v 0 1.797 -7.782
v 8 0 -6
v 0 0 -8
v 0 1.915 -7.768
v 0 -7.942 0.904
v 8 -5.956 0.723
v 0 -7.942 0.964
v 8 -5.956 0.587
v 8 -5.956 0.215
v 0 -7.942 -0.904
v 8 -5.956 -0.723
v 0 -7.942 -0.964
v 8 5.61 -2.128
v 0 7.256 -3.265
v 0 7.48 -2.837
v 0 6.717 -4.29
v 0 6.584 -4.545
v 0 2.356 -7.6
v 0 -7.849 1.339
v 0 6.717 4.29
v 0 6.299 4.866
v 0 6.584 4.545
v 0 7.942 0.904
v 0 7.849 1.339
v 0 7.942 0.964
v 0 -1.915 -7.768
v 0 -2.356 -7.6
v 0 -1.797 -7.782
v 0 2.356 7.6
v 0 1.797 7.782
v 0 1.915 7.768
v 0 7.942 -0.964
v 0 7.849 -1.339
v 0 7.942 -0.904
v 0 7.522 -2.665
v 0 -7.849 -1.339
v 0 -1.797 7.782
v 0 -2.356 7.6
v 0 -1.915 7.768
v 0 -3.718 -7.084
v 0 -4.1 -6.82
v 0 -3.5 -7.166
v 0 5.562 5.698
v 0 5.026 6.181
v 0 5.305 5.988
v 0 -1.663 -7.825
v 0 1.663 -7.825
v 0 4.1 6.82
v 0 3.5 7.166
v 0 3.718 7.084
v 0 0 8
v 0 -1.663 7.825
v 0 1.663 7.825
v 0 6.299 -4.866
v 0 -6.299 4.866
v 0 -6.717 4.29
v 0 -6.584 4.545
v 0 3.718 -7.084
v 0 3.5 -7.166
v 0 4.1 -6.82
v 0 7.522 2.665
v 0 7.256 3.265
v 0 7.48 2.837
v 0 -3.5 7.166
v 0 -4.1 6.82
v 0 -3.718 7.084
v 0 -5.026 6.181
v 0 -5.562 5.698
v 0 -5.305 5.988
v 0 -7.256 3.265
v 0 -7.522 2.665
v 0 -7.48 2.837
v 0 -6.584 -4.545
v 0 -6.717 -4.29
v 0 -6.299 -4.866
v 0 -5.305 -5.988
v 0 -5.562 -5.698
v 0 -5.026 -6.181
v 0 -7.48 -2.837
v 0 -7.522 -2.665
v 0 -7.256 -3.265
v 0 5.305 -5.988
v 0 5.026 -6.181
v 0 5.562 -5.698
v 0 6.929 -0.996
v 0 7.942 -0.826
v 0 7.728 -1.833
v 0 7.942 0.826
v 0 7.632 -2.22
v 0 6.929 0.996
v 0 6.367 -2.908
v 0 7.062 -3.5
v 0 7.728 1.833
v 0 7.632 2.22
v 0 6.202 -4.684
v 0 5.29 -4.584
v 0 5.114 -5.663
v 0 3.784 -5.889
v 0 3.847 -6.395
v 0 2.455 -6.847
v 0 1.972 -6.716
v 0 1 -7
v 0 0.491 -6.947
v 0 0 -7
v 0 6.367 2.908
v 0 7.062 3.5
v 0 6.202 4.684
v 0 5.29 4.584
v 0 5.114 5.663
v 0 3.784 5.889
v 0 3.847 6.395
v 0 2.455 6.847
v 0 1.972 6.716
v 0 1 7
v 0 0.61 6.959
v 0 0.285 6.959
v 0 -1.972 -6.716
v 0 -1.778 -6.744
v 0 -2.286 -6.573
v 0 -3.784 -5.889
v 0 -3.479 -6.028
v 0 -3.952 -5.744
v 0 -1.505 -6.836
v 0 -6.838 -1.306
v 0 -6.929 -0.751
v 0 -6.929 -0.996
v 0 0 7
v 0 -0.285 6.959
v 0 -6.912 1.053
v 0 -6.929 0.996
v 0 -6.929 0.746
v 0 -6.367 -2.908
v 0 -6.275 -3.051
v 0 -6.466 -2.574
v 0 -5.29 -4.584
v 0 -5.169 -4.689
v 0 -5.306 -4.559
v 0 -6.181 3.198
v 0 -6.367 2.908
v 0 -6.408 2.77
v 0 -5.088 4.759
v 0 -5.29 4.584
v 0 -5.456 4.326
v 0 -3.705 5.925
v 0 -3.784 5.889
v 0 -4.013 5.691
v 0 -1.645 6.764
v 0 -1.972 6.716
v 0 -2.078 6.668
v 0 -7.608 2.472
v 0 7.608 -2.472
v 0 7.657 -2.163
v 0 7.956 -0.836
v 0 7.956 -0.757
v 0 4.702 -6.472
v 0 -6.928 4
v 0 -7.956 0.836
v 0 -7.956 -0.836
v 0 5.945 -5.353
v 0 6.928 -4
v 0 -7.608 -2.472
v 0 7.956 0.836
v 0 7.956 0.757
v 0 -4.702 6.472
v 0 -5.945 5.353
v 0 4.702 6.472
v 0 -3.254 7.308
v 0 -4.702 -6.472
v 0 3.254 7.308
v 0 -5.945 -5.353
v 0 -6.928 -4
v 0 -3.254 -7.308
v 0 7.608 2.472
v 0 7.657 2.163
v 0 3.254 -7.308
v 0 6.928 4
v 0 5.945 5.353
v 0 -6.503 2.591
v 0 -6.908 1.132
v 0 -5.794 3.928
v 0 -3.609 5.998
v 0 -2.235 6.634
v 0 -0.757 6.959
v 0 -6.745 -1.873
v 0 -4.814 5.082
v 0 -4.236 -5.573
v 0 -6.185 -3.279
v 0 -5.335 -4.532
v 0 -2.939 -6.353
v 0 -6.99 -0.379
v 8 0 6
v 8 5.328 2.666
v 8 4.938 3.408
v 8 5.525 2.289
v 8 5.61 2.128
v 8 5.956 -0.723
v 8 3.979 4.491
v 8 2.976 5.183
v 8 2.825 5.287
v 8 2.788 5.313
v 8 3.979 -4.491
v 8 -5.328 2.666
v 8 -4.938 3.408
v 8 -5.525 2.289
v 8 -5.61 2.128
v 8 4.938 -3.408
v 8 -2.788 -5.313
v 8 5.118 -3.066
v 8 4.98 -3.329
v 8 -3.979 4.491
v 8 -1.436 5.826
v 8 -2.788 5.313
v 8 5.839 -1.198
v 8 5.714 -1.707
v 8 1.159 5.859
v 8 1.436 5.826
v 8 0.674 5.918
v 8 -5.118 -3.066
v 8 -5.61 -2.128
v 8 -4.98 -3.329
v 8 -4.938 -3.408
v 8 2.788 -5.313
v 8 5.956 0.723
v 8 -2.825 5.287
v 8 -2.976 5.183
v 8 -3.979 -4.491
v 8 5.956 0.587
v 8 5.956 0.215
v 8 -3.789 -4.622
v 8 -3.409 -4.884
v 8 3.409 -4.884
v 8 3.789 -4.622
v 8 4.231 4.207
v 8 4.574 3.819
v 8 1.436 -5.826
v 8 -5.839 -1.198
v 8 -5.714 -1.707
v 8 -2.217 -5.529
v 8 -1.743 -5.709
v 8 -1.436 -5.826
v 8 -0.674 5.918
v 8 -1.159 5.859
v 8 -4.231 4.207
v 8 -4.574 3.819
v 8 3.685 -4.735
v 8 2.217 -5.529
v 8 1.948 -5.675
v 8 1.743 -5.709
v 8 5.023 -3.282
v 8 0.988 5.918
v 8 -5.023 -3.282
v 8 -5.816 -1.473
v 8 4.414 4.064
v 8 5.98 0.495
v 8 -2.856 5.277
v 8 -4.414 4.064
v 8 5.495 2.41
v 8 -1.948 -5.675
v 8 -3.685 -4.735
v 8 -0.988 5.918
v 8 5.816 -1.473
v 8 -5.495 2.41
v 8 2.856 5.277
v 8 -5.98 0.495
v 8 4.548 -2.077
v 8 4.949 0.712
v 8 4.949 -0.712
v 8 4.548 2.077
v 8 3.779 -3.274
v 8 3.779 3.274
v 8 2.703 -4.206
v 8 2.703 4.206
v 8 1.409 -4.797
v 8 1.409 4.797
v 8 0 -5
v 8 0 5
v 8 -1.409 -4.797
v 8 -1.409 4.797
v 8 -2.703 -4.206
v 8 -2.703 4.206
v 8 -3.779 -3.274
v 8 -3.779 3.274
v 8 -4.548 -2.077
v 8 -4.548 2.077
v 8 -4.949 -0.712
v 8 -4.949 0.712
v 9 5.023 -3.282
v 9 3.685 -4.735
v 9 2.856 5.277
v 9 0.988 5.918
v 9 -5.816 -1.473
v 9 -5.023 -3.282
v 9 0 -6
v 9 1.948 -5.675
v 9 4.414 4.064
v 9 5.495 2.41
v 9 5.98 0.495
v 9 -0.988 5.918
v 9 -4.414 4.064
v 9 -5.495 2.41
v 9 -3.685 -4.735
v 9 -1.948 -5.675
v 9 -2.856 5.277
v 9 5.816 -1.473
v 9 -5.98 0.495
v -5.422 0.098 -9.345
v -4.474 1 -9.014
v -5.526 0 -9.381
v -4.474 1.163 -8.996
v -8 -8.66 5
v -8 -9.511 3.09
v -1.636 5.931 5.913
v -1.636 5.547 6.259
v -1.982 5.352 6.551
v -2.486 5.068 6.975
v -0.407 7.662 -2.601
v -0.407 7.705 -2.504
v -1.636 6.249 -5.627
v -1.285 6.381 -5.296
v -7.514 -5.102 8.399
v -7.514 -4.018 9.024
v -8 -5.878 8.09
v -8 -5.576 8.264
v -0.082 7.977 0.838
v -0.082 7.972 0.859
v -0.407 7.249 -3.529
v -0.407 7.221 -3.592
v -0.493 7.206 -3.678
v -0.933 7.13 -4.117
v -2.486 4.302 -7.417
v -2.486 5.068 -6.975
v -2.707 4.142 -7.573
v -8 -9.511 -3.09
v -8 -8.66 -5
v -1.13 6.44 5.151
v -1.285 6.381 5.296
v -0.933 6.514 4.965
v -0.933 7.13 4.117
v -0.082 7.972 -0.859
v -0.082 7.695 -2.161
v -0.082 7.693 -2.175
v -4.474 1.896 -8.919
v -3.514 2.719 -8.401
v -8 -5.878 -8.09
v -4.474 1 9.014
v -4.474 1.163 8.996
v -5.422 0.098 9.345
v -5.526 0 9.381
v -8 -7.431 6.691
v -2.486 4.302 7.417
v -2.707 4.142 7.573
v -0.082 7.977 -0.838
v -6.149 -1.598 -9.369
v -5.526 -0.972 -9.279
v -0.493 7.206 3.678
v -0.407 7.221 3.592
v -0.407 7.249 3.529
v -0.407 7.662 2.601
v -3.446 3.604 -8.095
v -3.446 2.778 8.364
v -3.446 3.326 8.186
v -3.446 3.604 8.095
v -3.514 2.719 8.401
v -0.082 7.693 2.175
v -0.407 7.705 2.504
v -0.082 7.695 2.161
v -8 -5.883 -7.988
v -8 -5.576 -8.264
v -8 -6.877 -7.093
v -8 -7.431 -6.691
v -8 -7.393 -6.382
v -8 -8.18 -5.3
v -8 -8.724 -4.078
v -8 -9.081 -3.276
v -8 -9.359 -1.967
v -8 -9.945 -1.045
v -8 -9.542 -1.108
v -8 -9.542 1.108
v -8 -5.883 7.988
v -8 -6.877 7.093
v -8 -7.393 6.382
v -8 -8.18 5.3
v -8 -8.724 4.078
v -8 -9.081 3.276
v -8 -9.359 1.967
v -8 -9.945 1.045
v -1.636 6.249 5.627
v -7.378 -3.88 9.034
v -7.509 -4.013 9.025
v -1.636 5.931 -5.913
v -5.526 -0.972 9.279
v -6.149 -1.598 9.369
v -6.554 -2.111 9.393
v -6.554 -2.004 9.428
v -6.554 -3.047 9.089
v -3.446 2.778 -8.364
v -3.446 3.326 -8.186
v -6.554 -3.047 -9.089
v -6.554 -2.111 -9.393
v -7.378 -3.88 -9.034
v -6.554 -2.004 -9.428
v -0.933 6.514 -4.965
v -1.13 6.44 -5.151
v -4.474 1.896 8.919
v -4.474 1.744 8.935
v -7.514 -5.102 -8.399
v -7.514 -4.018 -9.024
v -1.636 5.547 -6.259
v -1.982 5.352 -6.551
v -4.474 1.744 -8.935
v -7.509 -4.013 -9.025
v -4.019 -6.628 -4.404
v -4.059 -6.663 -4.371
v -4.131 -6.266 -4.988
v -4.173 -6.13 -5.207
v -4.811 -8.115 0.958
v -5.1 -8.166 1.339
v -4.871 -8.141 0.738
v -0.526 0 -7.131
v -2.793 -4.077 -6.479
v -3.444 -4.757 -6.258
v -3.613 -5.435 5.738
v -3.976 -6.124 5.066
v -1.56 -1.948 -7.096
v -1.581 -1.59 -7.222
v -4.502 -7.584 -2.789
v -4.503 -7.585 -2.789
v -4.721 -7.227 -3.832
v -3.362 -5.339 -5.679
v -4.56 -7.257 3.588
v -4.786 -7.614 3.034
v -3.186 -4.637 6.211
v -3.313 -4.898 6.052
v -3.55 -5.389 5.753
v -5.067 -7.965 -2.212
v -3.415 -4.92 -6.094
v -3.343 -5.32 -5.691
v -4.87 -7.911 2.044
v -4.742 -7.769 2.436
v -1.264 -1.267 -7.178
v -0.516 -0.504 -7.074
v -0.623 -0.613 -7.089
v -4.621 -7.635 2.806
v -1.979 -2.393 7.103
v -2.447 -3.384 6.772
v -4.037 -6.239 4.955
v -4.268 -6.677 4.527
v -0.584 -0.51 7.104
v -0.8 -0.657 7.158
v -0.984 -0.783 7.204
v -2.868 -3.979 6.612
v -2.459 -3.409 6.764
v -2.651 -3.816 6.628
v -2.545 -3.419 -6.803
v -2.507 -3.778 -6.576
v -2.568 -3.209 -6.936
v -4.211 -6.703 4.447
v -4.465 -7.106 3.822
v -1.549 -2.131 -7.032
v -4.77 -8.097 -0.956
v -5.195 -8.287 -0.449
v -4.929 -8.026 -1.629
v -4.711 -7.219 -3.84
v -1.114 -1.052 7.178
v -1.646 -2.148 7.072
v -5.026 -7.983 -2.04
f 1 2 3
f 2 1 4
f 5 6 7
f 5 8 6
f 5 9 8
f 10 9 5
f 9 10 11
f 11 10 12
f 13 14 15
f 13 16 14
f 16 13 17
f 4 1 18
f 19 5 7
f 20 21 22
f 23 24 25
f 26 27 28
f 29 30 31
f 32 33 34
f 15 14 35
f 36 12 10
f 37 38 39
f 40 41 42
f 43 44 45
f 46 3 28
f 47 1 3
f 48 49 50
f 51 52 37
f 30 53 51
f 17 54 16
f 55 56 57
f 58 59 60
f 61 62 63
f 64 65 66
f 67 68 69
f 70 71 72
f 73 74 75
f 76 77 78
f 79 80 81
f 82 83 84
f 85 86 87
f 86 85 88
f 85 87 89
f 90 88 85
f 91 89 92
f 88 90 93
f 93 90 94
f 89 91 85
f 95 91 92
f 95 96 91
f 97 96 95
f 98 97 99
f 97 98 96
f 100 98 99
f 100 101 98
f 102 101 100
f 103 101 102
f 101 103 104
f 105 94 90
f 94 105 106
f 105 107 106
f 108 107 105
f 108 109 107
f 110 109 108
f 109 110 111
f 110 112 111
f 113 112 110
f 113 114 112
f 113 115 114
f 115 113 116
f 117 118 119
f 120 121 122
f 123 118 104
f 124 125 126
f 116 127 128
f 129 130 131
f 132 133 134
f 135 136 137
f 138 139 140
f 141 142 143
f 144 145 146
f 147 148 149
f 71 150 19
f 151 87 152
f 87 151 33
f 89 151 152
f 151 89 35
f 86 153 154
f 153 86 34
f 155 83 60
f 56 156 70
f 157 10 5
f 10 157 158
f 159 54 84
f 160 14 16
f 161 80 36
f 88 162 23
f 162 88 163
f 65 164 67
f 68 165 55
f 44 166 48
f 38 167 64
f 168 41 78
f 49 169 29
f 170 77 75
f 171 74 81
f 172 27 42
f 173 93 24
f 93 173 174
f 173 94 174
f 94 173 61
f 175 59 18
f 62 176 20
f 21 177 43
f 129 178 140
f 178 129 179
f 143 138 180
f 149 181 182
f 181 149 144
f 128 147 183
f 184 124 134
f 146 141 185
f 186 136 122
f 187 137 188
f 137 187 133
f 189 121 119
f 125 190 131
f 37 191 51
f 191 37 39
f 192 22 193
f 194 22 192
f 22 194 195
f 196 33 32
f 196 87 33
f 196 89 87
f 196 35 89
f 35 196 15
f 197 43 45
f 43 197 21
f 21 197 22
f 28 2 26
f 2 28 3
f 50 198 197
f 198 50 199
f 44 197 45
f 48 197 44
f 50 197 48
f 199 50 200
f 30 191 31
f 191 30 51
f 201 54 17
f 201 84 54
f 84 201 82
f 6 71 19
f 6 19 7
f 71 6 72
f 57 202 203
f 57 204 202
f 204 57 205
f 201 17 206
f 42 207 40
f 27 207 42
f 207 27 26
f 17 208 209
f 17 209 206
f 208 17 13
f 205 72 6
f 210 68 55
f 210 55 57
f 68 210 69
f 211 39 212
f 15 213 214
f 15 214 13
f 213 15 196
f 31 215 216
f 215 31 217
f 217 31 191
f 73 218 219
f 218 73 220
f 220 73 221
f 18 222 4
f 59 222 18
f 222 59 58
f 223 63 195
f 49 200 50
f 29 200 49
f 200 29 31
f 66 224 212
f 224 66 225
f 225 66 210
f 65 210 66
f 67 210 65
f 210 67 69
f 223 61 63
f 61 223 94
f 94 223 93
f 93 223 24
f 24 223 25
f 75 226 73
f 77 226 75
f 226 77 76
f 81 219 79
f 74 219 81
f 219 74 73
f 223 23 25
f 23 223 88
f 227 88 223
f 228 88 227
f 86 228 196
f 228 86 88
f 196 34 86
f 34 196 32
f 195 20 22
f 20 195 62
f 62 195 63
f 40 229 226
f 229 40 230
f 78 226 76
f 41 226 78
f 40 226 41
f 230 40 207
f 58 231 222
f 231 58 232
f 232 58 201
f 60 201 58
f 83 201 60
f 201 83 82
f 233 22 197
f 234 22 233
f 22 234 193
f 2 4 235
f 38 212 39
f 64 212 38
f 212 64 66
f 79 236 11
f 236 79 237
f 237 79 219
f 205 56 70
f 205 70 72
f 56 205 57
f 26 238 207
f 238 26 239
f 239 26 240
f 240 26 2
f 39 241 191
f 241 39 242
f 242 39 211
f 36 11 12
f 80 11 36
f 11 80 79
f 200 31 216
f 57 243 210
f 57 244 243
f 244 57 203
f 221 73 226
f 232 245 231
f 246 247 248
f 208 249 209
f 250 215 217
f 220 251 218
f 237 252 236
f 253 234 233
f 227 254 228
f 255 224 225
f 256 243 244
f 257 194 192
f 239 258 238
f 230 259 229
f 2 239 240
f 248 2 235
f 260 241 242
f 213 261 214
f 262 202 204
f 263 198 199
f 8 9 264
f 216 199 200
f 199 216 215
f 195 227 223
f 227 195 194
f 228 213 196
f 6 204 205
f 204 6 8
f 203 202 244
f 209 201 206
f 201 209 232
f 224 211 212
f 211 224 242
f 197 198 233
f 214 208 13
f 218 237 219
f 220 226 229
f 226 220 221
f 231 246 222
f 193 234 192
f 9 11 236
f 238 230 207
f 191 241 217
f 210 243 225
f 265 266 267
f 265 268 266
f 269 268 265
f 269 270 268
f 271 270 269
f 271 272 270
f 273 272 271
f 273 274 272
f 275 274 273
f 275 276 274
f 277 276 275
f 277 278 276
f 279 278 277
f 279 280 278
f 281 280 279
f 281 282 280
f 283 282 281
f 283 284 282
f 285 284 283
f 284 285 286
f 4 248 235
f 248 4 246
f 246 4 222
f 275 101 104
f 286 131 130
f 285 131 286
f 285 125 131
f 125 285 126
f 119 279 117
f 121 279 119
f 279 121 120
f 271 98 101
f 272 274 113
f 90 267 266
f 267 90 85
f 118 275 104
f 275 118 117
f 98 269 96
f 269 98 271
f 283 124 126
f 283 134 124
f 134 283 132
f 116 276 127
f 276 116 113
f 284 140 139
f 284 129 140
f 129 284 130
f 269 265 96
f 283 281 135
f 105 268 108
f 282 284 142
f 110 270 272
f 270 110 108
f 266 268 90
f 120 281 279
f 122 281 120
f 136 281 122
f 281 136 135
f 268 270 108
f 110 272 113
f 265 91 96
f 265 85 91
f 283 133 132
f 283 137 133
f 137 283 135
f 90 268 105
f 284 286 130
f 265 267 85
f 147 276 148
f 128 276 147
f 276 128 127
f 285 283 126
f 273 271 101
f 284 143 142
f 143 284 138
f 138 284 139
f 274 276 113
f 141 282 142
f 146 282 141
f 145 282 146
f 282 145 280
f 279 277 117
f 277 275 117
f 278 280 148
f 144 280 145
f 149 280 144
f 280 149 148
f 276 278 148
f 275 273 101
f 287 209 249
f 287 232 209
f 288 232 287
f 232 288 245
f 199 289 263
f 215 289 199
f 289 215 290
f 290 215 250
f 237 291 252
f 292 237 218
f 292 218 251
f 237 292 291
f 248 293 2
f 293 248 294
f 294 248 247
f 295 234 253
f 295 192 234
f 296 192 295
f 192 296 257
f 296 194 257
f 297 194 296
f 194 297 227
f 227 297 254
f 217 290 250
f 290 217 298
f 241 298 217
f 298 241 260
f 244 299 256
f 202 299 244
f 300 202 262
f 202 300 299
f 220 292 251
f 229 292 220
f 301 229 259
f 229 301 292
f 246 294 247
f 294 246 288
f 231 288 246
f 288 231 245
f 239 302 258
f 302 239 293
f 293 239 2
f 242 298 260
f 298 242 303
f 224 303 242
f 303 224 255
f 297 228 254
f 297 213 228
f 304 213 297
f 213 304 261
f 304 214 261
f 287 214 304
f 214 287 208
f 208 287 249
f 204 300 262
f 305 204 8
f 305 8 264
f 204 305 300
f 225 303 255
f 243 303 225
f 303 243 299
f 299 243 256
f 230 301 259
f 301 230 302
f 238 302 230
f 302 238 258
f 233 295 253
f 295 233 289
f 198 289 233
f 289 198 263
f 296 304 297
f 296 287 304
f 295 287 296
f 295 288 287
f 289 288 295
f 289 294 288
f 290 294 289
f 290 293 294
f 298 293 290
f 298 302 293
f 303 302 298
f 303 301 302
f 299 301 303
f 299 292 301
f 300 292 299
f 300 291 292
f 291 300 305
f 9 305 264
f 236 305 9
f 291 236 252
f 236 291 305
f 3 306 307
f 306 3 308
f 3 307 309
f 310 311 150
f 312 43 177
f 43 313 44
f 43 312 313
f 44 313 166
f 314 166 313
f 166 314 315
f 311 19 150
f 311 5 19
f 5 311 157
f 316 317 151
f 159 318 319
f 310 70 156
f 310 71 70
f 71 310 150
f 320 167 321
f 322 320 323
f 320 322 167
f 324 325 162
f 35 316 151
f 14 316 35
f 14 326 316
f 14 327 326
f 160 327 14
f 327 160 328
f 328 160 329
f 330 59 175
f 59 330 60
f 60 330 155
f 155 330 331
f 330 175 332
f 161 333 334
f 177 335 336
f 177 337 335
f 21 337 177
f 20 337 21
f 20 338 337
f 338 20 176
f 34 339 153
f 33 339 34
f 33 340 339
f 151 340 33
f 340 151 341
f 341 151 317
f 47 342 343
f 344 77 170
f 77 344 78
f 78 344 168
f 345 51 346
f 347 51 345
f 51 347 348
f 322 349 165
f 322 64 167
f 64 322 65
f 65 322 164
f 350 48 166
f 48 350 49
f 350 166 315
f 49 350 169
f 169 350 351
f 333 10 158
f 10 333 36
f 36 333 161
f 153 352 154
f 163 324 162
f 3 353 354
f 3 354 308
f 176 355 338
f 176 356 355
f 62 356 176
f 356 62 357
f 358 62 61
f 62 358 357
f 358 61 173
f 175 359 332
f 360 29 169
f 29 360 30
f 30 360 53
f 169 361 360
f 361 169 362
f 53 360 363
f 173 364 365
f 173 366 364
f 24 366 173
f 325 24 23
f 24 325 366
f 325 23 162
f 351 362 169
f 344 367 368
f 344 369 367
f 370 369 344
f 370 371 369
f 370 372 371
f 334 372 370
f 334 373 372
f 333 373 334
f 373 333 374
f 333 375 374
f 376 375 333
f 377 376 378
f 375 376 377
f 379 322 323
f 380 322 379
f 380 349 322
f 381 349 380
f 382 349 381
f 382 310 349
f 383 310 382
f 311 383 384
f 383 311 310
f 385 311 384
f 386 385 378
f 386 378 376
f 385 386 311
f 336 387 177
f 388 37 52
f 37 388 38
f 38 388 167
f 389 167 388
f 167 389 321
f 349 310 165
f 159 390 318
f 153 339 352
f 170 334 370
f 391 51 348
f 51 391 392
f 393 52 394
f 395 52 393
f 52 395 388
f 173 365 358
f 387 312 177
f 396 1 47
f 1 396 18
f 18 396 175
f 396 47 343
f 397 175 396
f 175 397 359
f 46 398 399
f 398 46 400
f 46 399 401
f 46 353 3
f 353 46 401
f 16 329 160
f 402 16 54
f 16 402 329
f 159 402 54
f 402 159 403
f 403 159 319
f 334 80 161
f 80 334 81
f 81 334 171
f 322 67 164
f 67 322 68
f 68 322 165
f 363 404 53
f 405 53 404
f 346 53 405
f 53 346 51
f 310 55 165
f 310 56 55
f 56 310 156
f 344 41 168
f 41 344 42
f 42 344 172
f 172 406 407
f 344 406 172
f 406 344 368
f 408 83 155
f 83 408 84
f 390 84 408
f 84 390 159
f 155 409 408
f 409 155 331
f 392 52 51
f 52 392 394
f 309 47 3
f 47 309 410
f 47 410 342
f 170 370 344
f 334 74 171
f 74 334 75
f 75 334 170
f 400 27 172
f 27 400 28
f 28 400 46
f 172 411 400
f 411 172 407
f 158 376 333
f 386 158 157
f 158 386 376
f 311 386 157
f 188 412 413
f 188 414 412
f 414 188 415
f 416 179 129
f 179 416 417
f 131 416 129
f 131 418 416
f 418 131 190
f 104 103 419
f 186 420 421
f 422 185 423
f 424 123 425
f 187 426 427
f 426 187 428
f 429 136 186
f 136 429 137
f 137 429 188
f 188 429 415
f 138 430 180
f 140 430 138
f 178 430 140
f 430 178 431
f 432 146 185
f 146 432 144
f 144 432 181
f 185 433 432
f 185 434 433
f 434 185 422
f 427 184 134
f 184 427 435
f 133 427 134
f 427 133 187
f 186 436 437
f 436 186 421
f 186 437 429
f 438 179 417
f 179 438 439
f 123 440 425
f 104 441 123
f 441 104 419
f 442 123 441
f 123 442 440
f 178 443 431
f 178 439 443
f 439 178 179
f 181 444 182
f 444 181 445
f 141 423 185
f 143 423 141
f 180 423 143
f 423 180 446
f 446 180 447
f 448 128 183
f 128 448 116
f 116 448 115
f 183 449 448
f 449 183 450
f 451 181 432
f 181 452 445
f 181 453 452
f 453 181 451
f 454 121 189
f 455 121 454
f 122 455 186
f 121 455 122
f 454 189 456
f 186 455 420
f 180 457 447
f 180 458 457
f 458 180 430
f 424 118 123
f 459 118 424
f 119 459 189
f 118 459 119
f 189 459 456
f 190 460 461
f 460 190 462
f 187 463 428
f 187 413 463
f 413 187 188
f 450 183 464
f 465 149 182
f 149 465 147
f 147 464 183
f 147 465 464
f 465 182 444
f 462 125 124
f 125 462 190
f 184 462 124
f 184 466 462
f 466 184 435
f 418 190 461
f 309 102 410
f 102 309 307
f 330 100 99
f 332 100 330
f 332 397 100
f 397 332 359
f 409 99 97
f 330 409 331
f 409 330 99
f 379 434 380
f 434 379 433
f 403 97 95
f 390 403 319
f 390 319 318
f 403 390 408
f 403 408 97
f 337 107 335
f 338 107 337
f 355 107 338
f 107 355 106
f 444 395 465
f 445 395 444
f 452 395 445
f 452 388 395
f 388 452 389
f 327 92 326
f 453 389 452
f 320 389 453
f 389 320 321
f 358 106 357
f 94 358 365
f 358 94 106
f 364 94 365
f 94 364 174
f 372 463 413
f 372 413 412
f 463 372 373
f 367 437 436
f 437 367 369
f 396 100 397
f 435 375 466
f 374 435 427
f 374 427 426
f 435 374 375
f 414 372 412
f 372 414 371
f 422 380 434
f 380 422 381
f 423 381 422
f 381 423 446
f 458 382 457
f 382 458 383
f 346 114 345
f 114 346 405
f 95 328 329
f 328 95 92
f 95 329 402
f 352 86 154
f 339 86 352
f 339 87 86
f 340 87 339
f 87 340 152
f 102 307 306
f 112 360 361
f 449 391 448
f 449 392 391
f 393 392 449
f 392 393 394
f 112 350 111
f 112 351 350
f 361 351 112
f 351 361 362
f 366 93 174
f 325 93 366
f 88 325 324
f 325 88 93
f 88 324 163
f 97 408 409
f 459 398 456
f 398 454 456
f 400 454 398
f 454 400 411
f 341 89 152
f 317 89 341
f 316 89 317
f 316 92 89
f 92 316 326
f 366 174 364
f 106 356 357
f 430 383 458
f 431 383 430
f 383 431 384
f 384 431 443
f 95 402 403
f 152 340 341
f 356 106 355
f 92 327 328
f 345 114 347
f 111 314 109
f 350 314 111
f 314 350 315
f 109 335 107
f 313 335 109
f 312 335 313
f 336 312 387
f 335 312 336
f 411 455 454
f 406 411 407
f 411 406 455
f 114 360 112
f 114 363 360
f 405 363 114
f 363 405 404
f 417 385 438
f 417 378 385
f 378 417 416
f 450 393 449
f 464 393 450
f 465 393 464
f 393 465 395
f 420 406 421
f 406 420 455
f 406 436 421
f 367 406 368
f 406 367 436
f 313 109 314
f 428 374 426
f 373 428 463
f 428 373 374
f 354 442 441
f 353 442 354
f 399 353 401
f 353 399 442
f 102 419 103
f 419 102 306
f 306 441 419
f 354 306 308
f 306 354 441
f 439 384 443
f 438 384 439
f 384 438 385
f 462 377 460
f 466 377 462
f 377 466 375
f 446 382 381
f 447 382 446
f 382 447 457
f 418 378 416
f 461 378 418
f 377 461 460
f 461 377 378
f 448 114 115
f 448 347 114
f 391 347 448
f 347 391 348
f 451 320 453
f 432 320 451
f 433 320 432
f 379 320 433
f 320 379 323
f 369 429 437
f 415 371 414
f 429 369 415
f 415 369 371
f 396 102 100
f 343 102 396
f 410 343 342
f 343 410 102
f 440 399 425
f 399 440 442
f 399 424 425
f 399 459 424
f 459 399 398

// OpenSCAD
//goggles
//union(){}
//intersection(){

//cylinder(height, r1, r2, center=true/false)

union(){

union(){
translate([8,0,0]) rotate([90,90,90]) cylinder(1,6,6);
difference(){
translate([0,0,0]) rotate([90,90,90]) cylinder(8,8,6);
translate([0,0,0]) rotate([90,90,90]) cylinder(8,7,5);
}
}

//translate([-16,0,0])
difference(){
difference(){
translate([-8,0,0]) rotate([90,90,90]) cylinder(8,10,8);
translate([-8,0,0]) rotate([90,90,90]) cylinder(8,9,7);
}

translate([-20,1,0]) rotate([90,90,90]) cylinder(20,16,7);
}

}
